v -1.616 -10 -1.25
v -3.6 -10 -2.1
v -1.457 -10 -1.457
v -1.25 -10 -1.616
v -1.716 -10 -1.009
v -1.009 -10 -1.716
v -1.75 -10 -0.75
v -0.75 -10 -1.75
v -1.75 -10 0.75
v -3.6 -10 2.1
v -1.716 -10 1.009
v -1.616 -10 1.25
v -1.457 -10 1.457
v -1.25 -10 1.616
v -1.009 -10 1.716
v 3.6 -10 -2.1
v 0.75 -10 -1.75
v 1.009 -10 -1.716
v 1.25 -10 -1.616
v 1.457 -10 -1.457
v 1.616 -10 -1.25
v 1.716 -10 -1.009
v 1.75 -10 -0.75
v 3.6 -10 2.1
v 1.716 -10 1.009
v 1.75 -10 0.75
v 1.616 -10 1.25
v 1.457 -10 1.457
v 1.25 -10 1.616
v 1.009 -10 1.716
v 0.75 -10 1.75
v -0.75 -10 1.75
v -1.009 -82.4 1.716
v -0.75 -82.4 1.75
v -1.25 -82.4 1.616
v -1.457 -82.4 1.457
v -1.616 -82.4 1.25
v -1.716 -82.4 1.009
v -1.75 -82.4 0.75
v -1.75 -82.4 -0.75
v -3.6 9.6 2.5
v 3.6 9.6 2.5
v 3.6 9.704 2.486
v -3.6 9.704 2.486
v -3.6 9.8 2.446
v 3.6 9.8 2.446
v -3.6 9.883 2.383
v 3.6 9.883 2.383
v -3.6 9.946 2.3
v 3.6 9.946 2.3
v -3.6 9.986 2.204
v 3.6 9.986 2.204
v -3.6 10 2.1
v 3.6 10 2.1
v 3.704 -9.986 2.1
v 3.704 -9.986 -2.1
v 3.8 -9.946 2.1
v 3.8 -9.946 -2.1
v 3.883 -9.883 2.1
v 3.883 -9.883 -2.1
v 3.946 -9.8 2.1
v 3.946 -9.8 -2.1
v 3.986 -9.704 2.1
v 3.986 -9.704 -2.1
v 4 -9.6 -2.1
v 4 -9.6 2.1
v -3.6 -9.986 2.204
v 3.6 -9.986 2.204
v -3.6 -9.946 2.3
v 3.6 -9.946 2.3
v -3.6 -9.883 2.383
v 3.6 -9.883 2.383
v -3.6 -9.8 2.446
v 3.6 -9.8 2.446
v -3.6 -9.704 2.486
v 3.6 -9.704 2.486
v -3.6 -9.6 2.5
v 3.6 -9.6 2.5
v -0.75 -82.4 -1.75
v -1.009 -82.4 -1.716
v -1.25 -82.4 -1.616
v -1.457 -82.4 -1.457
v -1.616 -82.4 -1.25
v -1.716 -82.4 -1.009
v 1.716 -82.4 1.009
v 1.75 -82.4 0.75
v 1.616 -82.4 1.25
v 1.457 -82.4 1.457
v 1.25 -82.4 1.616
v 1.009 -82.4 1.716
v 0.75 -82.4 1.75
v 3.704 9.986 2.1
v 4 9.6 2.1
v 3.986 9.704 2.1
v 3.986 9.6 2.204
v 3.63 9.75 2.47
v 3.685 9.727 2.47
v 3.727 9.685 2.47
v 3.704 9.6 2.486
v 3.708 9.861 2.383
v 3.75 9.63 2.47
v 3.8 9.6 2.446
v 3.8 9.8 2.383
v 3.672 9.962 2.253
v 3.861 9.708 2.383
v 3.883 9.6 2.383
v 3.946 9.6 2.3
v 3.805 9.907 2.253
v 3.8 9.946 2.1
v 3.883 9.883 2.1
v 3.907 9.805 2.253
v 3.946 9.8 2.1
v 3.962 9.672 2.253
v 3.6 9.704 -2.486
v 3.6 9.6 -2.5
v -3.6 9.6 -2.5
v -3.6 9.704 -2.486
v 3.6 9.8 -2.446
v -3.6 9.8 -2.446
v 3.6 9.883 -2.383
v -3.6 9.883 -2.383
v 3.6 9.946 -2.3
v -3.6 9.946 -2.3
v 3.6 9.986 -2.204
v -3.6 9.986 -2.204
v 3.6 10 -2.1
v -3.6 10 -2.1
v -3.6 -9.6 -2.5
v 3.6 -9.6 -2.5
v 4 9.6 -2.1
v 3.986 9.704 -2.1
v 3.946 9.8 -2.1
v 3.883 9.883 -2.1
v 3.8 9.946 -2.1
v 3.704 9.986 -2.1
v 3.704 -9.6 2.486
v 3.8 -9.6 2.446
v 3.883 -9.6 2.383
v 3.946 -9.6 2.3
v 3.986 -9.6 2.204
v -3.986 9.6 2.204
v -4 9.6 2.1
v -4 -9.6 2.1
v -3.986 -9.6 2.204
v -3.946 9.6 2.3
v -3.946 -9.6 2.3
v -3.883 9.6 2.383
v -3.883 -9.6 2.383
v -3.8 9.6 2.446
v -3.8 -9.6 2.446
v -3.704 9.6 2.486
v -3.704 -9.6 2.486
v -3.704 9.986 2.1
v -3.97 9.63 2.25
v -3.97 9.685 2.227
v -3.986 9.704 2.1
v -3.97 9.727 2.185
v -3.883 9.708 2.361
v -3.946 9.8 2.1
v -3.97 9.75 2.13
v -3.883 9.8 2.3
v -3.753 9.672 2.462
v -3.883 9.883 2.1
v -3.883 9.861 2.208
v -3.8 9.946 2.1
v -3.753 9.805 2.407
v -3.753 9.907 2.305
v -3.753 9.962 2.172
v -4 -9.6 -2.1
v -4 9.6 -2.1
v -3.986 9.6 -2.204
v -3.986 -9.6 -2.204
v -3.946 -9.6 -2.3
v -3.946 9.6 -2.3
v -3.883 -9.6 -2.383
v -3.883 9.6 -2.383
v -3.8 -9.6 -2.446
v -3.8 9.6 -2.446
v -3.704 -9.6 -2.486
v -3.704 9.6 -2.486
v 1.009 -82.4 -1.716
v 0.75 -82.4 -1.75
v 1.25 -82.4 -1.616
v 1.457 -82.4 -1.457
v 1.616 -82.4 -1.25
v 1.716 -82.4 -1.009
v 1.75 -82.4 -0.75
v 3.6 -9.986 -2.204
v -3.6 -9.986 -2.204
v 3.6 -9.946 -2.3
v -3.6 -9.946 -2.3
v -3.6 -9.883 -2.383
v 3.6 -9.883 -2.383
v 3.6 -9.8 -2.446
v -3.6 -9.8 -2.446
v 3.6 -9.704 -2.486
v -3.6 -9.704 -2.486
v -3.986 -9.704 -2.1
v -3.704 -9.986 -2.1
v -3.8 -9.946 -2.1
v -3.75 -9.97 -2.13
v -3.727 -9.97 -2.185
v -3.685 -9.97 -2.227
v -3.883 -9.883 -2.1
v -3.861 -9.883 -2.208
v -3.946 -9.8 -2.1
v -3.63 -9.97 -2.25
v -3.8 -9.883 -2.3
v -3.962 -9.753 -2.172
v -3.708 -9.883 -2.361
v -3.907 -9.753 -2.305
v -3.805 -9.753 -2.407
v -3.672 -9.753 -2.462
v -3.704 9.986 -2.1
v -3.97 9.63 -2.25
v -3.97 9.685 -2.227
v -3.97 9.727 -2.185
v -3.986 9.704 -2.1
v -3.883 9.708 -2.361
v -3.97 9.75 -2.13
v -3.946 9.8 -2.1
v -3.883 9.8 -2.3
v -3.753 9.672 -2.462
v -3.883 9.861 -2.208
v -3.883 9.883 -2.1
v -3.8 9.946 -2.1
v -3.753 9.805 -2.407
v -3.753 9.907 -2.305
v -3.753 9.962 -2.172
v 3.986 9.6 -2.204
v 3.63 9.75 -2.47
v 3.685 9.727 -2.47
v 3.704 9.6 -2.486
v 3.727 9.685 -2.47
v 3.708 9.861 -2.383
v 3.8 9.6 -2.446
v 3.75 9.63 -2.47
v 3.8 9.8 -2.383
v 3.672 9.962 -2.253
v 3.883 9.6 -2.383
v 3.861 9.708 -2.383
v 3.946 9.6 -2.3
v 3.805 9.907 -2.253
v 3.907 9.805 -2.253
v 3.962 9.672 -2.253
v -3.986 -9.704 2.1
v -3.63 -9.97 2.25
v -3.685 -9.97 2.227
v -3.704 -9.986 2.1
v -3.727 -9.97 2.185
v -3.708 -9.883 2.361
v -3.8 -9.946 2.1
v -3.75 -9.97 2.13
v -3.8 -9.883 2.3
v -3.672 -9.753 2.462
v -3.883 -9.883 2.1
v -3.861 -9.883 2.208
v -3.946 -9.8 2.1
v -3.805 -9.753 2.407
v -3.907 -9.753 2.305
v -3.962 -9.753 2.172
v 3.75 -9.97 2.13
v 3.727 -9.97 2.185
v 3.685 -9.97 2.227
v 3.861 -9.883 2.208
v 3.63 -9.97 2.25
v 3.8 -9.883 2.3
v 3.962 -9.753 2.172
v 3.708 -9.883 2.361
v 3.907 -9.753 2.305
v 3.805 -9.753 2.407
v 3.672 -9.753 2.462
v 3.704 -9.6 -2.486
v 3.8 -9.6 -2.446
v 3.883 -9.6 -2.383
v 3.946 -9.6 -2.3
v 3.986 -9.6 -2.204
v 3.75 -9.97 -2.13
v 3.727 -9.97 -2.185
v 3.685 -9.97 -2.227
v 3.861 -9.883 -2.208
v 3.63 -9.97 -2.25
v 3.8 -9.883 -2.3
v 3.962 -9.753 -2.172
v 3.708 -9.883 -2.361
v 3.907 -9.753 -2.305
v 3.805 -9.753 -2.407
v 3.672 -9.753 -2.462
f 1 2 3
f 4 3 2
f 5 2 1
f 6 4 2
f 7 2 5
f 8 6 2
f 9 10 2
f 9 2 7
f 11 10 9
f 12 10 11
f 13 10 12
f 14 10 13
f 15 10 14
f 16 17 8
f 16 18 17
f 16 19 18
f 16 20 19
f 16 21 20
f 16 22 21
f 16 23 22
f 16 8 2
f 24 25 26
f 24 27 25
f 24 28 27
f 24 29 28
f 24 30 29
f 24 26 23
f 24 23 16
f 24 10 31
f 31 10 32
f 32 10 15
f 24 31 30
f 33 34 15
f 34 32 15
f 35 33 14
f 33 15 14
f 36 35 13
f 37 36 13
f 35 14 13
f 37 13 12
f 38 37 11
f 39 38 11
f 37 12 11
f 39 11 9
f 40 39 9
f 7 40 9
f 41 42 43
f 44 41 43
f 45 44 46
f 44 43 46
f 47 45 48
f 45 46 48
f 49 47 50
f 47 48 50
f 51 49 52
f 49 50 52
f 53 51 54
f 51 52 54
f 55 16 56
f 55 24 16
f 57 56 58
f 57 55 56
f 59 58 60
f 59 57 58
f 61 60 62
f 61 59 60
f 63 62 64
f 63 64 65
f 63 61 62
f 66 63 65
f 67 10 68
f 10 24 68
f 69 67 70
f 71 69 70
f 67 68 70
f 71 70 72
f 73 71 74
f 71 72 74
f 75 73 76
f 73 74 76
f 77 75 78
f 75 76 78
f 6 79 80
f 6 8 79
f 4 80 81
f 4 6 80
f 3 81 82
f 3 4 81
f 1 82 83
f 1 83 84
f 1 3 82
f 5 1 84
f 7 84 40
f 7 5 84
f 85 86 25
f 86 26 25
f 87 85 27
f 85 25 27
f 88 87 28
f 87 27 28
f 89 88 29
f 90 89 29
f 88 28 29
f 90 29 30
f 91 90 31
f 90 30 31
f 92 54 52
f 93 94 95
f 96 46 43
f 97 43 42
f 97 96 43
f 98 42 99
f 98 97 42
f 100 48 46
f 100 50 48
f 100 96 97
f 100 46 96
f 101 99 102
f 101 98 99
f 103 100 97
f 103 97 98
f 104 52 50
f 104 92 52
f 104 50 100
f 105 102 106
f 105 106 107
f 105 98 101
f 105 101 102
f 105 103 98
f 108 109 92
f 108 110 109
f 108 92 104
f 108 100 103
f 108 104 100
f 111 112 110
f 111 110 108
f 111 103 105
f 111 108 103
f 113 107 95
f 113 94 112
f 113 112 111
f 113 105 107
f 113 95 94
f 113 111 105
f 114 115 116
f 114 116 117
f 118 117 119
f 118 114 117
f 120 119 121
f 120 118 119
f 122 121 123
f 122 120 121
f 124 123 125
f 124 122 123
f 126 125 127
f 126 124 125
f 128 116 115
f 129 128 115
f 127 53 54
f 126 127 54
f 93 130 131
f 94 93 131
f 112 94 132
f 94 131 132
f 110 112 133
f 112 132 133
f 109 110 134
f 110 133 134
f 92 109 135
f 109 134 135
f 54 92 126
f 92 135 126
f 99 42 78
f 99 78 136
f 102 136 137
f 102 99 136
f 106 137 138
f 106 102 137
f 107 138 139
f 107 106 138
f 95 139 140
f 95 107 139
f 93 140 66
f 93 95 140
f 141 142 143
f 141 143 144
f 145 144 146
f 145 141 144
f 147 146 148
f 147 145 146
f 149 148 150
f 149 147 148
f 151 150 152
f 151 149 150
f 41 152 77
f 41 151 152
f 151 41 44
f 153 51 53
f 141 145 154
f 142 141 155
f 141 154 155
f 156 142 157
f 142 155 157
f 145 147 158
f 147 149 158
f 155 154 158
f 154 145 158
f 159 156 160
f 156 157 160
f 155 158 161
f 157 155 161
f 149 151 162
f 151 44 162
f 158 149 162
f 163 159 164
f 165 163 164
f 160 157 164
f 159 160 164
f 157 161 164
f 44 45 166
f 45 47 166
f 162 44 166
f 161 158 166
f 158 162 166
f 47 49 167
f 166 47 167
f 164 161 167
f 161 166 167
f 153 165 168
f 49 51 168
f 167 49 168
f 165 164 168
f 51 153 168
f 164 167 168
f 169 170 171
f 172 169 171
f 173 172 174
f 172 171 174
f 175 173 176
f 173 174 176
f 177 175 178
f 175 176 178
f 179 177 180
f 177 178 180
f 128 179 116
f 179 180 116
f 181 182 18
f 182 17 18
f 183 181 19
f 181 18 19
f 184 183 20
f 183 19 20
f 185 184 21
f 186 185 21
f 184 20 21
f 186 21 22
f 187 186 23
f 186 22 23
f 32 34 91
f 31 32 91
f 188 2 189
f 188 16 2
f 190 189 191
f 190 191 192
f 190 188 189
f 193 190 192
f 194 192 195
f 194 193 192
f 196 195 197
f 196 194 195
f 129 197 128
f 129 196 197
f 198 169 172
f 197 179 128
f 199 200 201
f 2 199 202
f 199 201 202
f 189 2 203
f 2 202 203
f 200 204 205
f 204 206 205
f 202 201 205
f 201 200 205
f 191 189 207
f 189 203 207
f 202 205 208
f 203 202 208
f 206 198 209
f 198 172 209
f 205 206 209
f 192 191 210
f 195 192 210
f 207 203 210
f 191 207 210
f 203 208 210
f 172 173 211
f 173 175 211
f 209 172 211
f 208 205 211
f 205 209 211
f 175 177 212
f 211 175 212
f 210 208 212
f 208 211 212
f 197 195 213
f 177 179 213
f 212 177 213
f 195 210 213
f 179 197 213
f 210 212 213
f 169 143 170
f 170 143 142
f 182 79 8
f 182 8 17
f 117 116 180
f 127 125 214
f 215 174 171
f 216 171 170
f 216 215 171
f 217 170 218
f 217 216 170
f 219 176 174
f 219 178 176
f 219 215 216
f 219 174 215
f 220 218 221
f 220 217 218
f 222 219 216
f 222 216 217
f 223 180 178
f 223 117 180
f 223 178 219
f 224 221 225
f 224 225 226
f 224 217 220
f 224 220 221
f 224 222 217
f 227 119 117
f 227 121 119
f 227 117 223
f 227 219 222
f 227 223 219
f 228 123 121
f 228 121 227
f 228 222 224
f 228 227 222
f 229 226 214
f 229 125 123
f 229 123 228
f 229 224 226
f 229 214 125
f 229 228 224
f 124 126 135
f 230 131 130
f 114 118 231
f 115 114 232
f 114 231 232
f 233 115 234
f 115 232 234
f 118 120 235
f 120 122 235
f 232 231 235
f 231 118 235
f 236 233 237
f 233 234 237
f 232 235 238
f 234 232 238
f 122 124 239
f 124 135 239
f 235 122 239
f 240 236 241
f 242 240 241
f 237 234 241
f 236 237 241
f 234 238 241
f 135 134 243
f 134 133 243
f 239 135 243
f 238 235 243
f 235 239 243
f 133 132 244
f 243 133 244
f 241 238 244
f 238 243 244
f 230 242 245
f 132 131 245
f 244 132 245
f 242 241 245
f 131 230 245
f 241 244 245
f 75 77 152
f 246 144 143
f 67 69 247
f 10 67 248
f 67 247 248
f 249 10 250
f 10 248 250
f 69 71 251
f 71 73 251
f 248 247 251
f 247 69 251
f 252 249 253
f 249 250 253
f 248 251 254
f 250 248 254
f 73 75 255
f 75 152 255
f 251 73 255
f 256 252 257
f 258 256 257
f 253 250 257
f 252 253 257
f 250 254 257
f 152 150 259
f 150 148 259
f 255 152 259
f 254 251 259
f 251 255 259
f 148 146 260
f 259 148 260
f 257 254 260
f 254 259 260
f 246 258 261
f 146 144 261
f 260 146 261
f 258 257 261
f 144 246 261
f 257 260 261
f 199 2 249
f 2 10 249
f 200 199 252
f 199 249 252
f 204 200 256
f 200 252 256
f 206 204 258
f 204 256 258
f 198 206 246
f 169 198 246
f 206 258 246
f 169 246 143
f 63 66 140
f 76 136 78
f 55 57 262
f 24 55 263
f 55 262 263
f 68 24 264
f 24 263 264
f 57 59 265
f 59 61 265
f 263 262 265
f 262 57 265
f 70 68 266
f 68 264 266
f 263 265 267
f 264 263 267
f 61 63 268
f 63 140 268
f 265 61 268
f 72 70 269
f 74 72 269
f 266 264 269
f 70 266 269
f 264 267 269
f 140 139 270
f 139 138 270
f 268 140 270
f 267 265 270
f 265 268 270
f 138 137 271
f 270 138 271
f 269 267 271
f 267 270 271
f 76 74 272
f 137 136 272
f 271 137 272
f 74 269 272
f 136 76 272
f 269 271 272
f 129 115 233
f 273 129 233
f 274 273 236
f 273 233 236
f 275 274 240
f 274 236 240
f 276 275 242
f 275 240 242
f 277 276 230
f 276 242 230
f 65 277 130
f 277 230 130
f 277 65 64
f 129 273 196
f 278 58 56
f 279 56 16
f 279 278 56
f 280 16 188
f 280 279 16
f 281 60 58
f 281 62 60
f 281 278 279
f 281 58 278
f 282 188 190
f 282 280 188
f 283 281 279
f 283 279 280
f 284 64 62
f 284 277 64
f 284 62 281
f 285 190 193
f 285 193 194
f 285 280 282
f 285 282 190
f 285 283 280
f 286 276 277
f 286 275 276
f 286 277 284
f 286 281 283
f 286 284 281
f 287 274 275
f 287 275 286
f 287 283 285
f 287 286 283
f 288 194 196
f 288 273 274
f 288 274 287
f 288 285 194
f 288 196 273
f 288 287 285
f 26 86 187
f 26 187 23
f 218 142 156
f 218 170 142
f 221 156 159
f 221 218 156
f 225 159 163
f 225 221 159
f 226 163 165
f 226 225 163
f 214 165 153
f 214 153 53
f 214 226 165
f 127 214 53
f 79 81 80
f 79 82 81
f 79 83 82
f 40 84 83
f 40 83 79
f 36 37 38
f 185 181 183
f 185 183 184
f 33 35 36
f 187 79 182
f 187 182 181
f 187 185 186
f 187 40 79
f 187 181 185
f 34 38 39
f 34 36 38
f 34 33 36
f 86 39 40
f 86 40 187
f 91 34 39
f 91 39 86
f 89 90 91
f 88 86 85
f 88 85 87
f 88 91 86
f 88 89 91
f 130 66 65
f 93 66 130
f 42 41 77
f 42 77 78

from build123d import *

# Parameters (mm, degrees)
F0_W     = 8
F0_H     = 20
F1_DEPTH = 2.5
F2_W     = 3.5
F2_H     = 75
F3_DEPTH = 1.75
F4_R     = 0.4
F5_R     = 1


with BuildPart() as f1:
    # F0 (on Top) → F1 (new body, symmetric)
    with BuildSketch(Plane.XY):
        Rectangle(F0_W, F0_H)
    extrude(amount=F1_DEPTH, both=True)

    # F2 (on Top) → F3 (join, symmetric)
    with BuildSketch(Plane.XY):
        with Locations((0, -44.9)):
            Rectangle(F2_W, F2_H)
    extrude(amount=F3_DEPTH, both=True)

    # F4
    f4_edges = [f1.edges().sort_by_distance(p)[0] for p in [
        (4, 10, 0),
        (0, 10, -2.5),
        (0, 10, 2.5),
        (-4, 0, 2.5),
        (4, 0, -2.5),
        (-4, 0, -2.5),
        (4, 0, 2.5),
        (-4, 10, 0),
        (4, -10, 0),
        (0, -10, 2.5),
        (-4, -10, 0),
        (0, -10, -2.5),
    ]]
    fillet(f4_edges, radius=F4_R)

    # F5
    f5_edges = [f1.edges().sort_by_distance(p)[0] for p in [
        (1.75, -46.2, -1.75),
        (-1.75, -46.2, -1.75),
        (1.75, -46.2, 1.75),
        (-1.75, -46.2, 1.75),
    ]]
    fillet(f5_edges, radius=F5_R)


solid = f1.part
